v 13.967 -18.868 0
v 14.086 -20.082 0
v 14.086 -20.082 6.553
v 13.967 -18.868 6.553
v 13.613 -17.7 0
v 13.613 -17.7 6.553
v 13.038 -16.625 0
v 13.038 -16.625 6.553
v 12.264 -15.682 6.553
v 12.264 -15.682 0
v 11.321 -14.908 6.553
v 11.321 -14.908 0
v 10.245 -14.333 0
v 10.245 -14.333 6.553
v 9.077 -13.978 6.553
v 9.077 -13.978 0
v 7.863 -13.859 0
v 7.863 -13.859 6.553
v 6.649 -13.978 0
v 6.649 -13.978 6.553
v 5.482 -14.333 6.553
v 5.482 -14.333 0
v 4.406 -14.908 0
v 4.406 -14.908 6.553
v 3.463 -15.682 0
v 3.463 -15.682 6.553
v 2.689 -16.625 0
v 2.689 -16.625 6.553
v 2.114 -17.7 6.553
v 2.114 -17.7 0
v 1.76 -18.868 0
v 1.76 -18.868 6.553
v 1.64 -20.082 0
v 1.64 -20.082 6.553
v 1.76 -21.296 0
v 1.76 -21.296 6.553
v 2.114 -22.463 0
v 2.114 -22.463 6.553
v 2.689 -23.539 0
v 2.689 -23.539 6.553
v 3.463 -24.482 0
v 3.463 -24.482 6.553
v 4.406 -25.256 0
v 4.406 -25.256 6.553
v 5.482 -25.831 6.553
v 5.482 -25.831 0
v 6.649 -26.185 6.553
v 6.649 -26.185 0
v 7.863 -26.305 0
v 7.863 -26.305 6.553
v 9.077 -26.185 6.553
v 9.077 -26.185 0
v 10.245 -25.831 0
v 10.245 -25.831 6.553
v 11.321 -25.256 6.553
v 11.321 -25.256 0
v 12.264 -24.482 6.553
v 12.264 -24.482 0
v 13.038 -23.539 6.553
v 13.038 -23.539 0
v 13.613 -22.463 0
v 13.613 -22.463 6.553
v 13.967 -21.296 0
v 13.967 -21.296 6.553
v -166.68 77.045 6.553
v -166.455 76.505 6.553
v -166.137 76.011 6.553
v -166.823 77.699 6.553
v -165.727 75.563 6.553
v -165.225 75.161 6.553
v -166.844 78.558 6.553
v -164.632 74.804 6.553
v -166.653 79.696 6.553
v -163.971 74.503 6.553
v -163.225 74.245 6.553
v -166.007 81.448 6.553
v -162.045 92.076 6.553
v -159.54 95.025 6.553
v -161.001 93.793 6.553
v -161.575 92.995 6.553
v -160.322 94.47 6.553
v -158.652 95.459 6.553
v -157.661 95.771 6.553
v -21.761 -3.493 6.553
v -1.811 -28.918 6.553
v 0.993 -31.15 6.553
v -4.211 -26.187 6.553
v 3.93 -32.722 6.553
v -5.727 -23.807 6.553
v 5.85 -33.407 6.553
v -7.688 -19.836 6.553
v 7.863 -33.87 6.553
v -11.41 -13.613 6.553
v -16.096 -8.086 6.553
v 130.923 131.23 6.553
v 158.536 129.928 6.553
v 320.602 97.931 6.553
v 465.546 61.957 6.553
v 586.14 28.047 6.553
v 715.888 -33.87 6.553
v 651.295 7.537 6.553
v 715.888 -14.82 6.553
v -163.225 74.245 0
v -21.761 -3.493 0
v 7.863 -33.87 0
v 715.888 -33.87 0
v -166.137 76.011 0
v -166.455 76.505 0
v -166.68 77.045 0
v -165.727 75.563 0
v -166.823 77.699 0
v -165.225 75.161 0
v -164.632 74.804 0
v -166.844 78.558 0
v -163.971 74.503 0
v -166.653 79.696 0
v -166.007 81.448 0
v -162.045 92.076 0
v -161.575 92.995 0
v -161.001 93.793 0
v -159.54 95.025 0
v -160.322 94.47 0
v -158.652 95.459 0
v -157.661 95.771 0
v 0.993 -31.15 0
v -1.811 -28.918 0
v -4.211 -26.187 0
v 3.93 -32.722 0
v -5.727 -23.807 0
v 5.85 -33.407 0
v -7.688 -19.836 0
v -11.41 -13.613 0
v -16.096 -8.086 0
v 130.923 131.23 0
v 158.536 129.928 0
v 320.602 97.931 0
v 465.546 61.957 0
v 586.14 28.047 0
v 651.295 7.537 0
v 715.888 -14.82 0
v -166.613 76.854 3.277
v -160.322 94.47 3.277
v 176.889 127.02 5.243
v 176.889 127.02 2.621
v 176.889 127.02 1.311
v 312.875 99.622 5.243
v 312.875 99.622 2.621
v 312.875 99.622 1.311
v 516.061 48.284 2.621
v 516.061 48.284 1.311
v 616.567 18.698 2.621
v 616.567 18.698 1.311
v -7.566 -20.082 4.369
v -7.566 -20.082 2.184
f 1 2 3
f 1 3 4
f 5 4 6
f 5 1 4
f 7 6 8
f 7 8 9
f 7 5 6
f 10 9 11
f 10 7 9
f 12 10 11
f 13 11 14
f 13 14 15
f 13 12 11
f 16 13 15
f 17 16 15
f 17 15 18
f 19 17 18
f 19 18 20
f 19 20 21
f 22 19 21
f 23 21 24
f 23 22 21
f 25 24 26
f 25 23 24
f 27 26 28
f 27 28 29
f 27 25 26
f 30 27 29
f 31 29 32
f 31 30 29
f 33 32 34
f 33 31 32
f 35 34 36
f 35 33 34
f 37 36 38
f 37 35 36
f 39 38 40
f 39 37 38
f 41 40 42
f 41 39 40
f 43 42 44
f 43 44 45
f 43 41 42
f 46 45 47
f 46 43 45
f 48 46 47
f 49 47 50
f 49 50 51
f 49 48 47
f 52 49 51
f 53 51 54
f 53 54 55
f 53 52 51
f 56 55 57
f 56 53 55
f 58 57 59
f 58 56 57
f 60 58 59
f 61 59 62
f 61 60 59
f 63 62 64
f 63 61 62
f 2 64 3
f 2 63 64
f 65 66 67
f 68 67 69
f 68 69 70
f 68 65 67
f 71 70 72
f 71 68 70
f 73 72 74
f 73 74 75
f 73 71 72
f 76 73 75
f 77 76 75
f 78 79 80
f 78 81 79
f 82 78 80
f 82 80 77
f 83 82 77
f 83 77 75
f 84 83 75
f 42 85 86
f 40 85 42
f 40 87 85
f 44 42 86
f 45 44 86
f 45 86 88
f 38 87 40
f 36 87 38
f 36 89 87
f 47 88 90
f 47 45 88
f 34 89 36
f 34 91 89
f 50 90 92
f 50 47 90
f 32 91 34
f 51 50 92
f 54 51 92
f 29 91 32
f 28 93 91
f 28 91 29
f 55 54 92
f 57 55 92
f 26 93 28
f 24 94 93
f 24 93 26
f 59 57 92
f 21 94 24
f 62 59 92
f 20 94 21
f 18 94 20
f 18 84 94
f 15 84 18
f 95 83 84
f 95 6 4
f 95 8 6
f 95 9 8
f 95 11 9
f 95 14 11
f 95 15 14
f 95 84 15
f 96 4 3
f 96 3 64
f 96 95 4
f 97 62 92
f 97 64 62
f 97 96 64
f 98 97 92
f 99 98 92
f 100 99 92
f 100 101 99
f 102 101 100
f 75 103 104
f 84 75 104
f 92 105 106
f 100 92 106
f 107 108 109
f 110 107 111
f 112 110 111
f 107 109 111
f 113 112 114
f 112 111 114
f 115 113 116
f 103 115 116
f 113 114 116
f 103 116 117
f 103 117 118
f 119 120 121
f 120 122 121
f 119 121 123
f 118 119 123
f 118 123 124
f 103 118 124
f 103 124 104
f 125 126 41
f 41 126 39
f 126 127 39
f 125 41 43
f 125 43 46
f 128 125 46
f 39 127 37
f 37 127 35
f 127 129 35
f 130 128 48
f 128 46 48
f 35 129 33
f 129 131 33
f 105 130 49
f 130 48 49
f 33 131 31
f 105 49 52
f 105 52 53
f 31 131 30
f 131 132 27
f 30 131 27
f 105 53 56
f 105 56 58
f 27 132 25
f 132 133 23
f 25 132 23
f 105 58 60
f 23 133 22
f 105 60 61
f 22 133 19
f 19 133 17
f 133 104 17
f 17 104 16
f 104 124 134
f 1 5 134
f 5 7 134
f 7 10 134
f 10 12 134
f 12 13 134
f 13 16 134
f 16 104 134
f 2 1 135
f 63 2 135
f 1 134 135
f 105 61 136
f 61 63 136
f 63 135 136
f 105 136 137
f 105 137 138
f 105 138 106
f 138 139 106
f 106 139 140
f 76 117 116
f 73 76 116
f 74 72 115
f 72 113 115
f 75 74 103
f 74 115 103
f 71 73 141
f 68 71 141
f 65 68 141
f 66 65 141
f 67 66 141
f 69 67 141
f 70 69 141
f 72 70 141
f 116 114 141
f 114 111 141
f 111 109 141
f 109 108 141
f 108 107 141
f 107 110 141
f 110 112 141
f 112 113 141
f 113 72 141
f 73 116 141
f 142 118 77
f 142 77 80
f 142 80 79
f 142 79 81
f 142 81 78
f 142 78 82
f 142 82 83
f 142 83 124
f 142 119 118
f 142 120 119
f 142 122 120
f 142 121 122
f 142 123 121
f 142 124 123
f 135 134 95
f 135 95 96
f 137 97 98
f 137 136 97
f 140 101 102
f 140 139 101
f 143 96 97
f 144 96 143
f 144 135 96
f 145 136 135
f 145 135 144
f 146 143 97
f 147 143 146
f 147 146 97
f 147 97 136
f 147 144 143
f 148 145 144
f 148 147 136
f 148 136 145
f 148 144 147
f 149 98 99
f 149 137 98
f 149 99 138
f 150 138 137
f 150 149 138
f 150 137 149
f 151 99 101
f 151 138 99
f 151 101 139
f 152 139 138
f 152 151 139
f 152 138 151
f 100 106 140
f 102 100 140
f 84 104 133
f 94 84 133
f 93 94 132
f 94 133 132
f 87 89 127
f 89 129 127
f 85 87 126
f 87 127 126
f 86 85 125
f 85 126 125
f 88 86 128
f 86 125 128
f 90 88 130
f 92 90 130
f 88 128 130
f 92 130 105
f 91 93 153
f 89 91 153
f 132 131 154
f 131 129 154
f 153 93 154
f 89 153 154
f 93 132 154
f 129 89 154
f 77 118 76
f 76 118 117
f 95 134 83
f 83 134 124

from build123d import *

# Parameters (mm, degrees)
SKETCH1_R           = 6.223
BOSS_EXTRUDE1_DEPTH = 6.5532


with BuildPart() as part:
    # Sketch1 → Boss-Extrude1 (new body)
    with BuildSketch(Plane.XY):
        with BuildLine():
            Line((7.863413581, -33.869503221), (715.888413581, -33.869503221))
            Line((715.888413581, -33.869503221), (715.888413581, -14.819503221))
            add(Edge.make_bspline(
                [(130.923235962, 131.230496779), (144.565200568, 132.032600728), (175.745486699, 127.859730288), (235.979768818, 114.85150342), (312.791548306, 100.519974188), (477.93566039, 59.855493816), (612.69545282, 22.729861701), (715.888413581, -14.819503221)],
                knots=[0, 0, 0, 0, 0.067559052, 0.155584559, 0.306170235, 0.45538855, 1, 1, 1, 1], degree=3))
            Line((130.923235962, 131.230496779), (-157.661182161, 95.771476732))
            add(Edge.make_bspline(
                [(-162.045338663, 92.076043846), (-160.791359706, 95.015911404), (-157.661182161, 95.771476732)],
                knots=[0, 0, 0, 1, 1, 1], degree=2))
            Line((-162.045338663, 92.076043846), (-166.007371822, 81.448210611))
            add(Edge.make_bspline(
                [(-166.007371822, 81.448210611), (-168.608963638, 75.860668743), (-163.225353362, 74.245207536)],
                knots=[0, 0, 0, 1, 1, 1], degree=2))
            Line((-163.225353362, 74.245207536), (-21.760854311, -3.492806329))
            add(Edge.make_bspline(
                [(-21.760854311, -3.492806329), (-15.52403959, -7.589674855), (-9.833439316, -14.720767687), (-4.017541939, -28.023280736), (2.081063731, -32.902187391), (7.863413581, -33.869503221)],
                knots=[0, 0, 0, 0, 0.506293101, 0.611828229, 1, 1, 1, 1], degree=3))
        make_face()
        with Locations((7.863413581, -20.081840024)):
            Circle(SKETCH1_R, mode=Mode.SUBTRACT)
    extrude(amount=BOSS_EXTRUDE1_DEPTH)


solid = part.part
